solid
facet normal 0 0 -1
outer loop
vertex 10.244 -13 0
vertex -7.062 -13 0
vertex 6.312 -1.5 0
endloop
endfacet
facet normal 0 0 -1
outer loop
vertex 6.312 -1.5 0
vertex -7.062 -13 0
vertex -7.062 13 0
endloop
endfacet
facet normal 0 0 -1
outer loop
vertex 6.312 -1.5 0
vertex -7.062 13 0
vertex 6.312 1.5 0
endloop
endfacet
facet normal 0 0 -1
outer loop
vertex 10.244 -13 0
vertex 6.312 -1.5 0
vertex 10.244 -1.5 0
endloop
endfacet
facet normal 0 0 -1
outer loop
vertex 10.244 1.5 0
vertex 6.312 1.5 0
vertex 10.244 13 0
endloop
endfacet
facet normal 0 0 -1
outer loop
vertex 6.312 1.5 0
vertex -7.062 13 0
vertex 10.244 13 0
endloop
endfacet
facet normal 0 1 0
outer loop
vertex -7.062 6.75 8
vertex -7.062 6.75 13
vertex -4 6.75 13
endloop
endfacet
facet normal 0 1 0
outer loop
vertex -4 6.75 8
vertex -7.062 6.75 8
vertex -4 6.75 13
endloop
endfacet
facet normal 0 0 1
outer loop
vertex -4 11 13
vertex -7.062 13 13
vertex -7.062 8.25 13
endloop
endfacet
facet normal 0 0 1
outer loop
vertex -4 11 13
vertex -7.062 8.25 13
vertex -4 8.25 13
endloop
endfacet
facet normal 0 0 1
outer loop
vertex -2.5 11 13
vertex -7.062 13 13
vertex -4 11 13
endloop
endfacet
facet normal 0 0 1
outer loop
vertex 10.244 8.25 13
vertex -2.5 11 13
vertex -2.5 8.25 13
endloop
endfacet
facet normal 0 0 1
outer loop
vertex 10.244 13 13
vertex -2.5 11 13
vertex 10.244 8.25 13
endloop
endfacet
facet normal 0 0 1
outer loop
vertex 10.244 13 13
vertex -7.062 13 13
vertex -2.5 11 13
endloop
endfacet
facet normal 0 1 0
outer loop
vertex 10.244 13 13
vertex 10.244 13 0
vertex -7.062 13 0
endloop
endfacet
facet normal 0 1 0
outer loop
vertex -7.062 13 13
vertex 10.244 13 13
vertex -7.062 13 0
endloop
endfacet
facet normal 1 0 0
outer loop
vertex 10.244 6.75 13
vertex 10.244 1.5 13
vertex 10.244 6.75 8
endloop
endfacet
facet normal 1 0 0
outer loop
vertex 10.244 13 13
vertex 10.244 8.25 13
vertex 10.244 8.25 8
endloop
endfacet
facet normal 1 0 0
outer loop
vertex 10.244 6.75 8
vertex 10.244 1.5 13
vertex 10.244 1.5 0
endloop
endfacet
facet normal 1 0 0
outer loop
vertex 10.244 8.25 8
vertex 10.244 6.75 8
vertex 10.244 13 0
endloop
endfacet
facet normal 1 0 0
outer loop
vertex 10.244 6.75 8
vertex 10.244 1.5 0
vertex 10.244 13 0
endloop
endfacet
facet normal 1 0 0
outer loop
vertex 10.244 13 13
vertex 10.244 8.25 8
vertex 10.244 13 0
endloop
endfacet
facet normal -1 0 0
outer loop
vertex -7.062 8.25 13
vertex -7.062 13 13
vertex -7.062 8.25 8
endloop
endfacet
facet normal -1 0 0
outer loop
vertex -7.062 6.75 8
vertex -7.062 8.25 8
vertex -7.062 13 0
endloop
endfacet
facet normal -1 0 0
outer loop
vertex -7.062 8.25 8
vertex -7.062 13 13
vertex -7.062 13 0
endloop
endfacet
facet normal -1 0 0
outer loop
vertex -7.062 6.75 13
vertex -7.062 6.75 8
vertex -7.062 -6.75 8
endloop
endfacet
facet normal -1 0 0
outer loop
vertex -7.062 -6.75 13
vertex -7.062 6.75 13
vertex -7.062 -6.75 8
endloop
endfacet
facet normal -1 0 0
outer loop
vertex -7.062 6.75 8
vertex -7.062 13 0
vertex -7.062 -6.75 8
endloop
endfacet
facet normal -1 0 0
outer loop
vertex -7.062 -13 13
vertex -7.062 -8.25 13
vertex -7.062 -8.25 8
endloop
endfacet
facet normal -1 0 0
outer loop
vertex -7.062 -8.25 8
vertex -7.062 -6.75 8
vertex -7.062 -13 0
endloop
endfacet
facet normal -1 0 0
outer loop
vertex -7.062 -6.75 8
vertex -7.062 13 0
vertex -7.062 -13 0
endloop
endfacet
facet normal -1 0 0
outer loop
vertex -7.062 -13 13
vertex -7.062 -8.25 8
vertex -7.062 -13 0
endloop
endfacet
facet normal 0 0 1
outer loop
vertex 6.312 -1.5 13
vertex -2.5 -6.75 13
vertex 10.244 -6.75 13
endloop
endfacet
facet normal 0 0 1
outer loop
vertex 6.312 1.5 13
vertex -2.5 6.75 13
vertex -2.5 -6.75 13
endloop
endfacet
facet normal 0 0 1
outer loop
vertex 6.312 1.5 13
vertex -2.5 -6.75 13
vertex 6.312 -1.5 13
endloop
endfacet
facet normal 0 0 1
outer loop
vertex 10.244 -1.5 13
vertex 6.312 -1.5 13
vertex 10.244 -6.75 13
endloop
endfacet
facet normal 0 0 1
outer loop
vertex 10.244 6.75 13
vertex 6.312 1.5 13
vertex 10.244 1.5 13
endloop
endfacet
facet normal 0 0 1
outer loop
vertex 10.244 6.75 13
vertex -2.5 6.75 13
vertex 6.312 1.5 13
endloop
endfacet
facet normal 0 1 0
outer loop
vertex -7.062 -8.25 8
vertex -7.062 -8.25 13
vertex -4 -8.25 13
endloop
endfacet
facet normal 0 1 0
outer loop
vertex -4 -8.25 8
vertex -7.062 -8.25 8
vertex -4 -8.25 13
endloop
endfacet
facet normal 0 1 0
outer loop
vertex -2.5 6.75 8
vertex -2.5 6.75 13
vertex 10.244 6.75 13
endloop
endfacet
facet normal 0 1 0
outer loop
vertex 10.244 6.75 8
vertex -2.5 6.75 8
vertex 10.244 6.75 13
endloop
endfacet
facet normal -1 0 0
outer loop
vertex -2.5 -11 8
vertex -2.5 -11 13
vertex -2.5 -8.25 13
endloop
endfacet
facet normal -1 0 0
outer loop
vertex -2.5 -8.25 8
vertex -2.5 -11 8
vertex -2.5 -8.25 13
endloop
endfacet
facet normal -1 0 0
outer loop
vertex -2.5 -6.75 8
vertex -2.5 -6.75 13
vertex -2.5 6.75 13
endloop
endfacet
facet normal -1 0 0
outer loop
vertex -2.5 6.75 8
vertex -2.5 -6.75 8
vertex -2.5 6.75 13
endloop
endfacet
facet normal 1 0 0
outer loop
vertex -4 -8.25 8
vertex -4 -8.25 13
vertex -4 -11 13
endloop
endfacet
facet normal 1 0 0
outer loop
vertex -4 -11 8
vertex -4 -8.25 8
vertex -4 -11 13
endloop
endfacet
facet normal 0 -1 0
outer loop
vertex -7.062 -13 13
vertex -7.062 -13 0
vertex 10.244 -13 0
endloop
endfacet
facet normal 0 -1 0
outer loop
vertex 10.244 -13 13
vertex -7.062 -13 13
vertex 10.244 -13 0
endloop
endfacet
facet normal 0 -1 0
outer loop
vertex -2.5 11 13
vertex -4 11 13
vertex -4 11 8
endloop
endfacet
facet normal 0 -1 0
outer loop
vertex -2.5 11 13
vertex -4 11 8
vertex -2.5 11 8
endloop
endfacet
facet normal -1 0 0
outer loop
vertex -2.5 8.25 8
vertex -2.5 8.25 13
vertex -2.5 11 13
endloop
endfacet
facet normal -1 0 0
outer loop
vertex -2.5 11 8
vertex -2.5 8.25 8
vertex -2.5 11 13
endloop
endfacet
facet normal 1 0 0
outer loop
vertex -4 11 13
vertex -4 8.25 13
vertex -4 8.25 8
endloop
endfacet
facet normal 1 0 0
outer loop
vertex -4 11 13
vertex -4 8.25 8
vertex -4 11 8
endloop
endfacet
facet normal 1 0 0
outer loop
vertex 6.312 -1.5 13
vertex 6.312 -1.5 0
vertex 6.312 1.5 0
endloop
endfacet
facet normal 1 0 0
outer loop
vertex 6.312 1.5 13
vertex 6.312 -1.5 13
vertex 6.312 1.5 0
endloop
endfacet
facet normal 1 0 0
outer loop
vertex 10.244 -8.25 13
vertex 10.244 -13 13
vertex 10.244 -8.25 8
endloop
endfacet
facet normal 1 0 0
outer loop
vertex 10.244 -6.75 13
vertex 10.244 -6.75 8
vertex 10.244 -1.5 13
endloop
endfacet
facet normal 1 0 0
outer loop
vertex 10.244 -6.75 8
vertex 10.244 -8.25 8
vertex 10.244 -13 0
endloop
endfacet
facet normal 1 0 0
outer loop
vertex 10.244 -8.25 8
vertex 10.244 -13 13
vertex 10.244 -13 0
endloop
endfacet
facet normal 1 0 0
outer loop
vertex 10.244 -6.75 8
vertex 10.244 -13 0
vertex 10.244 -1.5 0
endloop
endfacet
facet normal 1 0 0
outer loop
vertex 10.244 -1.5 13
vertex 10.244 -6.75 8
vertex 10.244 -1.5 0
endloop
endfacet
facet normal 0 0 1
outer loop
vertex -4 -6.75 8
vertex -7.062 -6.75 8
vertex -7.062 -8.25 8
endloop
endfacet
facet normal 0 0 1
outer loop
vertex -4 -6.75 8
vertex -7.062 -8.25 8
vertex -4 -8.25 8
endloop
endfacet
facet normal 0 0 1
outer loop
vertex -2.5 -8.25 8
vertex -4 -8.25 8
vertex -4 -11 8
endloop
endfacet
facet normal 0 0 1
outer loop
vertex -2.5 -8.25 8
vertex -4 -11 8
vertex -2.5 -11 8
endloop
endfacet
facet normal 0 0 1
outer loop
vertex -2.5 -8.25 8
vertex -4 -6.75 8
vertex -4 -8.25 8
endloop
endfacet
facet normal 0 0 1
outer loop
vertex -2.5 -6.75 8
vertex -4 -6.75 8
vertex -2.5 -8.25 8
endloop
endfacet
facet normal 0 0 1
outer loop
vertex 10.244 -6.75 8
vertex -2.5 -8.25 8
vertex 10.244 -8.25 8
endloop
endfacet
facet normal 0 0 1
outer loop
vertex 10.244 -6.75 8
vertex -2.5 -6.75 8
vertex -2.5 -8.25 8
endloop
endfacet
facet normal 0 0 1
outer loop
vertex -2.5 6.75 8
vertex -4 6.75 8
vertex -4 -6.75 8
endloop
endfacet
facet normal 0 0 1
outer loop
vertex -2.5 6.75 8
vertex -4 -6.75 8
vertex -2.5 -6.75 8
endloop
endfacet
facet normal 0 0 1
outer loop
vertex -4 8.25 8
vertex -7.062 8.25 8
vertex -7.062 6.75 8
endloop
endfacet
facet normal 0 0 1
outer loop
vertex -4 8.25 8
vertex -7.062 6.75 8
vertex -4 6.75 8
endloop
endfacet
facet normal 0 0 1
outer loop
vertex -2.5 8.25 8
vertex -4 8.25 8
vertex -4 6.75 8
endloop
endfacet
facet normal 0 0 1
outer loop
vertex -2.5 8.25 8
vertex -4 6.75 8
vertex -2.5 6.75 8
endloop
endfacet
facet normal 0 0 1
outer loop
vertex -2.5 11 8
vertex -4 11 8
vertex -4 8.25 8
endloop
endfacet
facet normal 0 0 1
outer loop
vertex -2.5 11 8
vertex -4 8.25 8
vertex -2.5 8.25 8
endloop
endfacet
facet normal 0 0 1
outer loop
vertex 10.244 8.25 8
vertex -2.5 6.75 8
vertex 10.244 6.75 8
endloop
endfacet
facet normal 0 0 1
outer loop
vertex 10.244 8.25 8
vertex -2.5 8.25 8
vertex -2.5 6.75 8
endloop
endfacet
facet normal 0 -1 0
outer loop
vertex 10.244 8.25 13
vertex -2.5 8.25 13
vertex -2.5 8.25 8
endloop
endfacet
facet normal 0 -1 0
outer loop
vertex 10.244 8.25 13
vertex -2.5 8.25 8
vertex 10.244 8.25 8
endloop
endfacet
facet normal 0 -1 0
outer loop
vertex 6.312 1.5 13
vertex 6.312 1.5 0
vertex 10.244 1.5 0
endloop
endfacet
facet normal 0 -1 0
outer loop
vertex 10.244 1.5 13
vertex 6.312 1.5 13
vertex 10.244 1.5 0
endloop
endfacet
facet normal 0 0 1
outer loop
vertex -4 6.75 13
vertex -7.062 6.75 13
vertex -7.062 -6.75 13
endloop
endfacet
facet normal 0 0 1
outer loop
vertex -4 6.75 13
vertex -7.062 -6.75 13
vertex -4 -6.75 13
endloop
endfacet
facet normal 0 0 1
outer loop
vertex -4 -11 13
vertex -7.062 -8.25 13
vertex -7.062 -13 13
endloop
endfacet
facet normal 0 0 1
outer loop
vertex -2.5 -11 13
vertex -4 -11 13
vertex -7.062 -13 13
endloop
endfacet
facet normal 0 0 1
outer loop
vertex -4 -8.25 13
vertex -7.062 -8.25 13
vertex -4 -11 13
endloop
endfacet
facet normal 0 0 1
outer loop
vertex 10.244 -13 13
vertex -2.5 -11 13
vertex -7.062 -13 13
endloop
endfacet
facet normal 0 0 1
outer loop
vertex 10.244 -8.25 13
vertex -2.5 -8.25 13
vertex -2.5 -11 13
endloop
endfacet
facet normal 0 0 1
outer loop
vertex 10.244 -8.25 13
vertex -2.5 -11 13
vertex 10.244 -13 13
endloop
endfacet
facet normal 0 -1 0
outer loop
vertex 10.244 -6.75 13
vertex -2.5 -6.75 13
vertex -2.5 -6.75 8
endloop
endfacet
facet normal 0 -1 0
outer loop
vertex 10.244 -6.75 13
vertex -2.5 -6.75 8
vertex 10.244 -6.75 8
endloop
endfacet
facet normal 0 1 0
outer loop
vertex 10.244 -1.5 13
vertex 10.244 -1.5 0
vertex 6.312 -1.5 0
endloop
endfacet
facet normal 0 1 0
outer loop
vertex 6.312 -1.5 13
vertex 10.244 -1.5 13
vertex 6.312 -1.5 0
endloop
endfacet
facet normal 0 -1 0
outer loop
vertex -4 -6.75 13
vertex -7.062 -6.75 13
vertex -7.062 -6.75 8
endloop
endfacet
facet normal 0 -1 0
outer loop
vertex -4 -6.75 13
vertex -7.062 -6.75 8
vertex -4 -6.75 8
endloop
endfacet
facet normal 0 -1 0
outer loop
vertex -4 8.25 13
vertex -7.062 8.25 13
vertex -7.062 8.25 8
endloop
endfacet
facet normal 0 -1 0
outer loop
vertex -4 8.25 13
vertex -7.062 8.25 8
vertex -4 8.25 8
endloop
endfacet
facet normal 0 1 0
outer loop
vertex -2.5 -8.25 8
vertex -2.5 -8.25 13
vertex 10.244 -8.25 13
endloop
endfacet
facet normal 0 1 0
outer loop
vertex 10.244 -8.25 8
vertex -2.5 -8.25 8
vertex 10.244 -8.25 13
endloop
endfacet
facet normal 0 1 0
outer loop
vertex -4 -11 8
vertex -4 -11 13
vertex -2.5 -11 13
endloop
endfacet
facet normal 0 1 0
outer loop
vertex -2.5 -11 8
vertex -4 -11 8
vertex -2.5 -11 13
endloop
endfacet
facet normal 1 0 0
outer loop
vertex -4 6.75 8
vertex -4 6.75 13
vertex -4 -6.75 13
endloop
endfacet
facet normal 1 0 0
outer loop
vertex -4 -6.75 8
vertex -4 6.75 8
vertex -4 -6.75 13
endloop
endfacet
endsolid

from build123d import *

# Parameters (mm, degrees)
BOSS_EXTRUDE1_DEPTH = 13
SKETCH2_W           = 12.743753884
SKETCH2_H           = 1.5
SKETCH2_W_2         = 1.5
SKETCH2_H_2         = 2.75
SKETCH2_W_3         = 3.0625
SKETCH2_H_3         = 13.5
CUT_EXTRUDE1_DEPTH  = 5


with BuildPart() as part:
    # Sketch1 → Boss-Extrude1 (new body)
    with BuildSketch(Plane.XY):
        Polygon((10.243753884, 1.5), (10.243753884, 13), (8.5625, 13), (7.0625, 13), (-7.0625, 13), (-7.0625, -13), (7.0625, -13), (8.5625, -13), (10.243753884, -13), (10.243753884, -1.5), (9.3125, -1.5), (6.3125, -1.5), (6.3125, 1.5), (9.3125, 1.5), align=None)
    extrude(amount=BOSS_EXTRUDE1_DEPTH)

    # Sketch2 → Cut-Extrude1 (cut)
    with BuildSketch(Plane.XY.offset(13)):
        with Locations((3.871876942, 7.5)):
            Rectangle(SKETCH2_W, SKETCH2_H)
        with Locations((-3.25, 9.625)):
            Rectangle(SKETCH2_W_2, SKETCH2_H_2)
        with Locations((-5.53125, 7.5)):
            Rectangle(SKETCH2_W_3, SKETCH2_H)
        with Locations((-3.25, 7.5)):
            Rectangle(SKETCH2_W_2, SKETCH2_H)
        with Locations((-3.25, 0)):
            Rectangle(SKETCH2_W_2, SKETCH2_H_3)
        with Locations((-3.25, -9.625)):
            Rectangle(SKETCH2_W_2, SKETCH2_H_2)
        with Locations((-3.25, -7.5)):
            Rectangle(SKETCH2_W_2, SKETCH2_H)
        with Locations((-5.53125, -7.5)):
            Rectangle(SKETCH2_W_3, SKETCH2_H)
        with Locations((3.871876942, -7.5)):
            Rectangle(SKETCH2_W, SKETCH2_H)
    extrude(amount=-CUT_EXTRUDE1_DEPTH, mode=Mode.SUBTRACT)


solid = part.part
